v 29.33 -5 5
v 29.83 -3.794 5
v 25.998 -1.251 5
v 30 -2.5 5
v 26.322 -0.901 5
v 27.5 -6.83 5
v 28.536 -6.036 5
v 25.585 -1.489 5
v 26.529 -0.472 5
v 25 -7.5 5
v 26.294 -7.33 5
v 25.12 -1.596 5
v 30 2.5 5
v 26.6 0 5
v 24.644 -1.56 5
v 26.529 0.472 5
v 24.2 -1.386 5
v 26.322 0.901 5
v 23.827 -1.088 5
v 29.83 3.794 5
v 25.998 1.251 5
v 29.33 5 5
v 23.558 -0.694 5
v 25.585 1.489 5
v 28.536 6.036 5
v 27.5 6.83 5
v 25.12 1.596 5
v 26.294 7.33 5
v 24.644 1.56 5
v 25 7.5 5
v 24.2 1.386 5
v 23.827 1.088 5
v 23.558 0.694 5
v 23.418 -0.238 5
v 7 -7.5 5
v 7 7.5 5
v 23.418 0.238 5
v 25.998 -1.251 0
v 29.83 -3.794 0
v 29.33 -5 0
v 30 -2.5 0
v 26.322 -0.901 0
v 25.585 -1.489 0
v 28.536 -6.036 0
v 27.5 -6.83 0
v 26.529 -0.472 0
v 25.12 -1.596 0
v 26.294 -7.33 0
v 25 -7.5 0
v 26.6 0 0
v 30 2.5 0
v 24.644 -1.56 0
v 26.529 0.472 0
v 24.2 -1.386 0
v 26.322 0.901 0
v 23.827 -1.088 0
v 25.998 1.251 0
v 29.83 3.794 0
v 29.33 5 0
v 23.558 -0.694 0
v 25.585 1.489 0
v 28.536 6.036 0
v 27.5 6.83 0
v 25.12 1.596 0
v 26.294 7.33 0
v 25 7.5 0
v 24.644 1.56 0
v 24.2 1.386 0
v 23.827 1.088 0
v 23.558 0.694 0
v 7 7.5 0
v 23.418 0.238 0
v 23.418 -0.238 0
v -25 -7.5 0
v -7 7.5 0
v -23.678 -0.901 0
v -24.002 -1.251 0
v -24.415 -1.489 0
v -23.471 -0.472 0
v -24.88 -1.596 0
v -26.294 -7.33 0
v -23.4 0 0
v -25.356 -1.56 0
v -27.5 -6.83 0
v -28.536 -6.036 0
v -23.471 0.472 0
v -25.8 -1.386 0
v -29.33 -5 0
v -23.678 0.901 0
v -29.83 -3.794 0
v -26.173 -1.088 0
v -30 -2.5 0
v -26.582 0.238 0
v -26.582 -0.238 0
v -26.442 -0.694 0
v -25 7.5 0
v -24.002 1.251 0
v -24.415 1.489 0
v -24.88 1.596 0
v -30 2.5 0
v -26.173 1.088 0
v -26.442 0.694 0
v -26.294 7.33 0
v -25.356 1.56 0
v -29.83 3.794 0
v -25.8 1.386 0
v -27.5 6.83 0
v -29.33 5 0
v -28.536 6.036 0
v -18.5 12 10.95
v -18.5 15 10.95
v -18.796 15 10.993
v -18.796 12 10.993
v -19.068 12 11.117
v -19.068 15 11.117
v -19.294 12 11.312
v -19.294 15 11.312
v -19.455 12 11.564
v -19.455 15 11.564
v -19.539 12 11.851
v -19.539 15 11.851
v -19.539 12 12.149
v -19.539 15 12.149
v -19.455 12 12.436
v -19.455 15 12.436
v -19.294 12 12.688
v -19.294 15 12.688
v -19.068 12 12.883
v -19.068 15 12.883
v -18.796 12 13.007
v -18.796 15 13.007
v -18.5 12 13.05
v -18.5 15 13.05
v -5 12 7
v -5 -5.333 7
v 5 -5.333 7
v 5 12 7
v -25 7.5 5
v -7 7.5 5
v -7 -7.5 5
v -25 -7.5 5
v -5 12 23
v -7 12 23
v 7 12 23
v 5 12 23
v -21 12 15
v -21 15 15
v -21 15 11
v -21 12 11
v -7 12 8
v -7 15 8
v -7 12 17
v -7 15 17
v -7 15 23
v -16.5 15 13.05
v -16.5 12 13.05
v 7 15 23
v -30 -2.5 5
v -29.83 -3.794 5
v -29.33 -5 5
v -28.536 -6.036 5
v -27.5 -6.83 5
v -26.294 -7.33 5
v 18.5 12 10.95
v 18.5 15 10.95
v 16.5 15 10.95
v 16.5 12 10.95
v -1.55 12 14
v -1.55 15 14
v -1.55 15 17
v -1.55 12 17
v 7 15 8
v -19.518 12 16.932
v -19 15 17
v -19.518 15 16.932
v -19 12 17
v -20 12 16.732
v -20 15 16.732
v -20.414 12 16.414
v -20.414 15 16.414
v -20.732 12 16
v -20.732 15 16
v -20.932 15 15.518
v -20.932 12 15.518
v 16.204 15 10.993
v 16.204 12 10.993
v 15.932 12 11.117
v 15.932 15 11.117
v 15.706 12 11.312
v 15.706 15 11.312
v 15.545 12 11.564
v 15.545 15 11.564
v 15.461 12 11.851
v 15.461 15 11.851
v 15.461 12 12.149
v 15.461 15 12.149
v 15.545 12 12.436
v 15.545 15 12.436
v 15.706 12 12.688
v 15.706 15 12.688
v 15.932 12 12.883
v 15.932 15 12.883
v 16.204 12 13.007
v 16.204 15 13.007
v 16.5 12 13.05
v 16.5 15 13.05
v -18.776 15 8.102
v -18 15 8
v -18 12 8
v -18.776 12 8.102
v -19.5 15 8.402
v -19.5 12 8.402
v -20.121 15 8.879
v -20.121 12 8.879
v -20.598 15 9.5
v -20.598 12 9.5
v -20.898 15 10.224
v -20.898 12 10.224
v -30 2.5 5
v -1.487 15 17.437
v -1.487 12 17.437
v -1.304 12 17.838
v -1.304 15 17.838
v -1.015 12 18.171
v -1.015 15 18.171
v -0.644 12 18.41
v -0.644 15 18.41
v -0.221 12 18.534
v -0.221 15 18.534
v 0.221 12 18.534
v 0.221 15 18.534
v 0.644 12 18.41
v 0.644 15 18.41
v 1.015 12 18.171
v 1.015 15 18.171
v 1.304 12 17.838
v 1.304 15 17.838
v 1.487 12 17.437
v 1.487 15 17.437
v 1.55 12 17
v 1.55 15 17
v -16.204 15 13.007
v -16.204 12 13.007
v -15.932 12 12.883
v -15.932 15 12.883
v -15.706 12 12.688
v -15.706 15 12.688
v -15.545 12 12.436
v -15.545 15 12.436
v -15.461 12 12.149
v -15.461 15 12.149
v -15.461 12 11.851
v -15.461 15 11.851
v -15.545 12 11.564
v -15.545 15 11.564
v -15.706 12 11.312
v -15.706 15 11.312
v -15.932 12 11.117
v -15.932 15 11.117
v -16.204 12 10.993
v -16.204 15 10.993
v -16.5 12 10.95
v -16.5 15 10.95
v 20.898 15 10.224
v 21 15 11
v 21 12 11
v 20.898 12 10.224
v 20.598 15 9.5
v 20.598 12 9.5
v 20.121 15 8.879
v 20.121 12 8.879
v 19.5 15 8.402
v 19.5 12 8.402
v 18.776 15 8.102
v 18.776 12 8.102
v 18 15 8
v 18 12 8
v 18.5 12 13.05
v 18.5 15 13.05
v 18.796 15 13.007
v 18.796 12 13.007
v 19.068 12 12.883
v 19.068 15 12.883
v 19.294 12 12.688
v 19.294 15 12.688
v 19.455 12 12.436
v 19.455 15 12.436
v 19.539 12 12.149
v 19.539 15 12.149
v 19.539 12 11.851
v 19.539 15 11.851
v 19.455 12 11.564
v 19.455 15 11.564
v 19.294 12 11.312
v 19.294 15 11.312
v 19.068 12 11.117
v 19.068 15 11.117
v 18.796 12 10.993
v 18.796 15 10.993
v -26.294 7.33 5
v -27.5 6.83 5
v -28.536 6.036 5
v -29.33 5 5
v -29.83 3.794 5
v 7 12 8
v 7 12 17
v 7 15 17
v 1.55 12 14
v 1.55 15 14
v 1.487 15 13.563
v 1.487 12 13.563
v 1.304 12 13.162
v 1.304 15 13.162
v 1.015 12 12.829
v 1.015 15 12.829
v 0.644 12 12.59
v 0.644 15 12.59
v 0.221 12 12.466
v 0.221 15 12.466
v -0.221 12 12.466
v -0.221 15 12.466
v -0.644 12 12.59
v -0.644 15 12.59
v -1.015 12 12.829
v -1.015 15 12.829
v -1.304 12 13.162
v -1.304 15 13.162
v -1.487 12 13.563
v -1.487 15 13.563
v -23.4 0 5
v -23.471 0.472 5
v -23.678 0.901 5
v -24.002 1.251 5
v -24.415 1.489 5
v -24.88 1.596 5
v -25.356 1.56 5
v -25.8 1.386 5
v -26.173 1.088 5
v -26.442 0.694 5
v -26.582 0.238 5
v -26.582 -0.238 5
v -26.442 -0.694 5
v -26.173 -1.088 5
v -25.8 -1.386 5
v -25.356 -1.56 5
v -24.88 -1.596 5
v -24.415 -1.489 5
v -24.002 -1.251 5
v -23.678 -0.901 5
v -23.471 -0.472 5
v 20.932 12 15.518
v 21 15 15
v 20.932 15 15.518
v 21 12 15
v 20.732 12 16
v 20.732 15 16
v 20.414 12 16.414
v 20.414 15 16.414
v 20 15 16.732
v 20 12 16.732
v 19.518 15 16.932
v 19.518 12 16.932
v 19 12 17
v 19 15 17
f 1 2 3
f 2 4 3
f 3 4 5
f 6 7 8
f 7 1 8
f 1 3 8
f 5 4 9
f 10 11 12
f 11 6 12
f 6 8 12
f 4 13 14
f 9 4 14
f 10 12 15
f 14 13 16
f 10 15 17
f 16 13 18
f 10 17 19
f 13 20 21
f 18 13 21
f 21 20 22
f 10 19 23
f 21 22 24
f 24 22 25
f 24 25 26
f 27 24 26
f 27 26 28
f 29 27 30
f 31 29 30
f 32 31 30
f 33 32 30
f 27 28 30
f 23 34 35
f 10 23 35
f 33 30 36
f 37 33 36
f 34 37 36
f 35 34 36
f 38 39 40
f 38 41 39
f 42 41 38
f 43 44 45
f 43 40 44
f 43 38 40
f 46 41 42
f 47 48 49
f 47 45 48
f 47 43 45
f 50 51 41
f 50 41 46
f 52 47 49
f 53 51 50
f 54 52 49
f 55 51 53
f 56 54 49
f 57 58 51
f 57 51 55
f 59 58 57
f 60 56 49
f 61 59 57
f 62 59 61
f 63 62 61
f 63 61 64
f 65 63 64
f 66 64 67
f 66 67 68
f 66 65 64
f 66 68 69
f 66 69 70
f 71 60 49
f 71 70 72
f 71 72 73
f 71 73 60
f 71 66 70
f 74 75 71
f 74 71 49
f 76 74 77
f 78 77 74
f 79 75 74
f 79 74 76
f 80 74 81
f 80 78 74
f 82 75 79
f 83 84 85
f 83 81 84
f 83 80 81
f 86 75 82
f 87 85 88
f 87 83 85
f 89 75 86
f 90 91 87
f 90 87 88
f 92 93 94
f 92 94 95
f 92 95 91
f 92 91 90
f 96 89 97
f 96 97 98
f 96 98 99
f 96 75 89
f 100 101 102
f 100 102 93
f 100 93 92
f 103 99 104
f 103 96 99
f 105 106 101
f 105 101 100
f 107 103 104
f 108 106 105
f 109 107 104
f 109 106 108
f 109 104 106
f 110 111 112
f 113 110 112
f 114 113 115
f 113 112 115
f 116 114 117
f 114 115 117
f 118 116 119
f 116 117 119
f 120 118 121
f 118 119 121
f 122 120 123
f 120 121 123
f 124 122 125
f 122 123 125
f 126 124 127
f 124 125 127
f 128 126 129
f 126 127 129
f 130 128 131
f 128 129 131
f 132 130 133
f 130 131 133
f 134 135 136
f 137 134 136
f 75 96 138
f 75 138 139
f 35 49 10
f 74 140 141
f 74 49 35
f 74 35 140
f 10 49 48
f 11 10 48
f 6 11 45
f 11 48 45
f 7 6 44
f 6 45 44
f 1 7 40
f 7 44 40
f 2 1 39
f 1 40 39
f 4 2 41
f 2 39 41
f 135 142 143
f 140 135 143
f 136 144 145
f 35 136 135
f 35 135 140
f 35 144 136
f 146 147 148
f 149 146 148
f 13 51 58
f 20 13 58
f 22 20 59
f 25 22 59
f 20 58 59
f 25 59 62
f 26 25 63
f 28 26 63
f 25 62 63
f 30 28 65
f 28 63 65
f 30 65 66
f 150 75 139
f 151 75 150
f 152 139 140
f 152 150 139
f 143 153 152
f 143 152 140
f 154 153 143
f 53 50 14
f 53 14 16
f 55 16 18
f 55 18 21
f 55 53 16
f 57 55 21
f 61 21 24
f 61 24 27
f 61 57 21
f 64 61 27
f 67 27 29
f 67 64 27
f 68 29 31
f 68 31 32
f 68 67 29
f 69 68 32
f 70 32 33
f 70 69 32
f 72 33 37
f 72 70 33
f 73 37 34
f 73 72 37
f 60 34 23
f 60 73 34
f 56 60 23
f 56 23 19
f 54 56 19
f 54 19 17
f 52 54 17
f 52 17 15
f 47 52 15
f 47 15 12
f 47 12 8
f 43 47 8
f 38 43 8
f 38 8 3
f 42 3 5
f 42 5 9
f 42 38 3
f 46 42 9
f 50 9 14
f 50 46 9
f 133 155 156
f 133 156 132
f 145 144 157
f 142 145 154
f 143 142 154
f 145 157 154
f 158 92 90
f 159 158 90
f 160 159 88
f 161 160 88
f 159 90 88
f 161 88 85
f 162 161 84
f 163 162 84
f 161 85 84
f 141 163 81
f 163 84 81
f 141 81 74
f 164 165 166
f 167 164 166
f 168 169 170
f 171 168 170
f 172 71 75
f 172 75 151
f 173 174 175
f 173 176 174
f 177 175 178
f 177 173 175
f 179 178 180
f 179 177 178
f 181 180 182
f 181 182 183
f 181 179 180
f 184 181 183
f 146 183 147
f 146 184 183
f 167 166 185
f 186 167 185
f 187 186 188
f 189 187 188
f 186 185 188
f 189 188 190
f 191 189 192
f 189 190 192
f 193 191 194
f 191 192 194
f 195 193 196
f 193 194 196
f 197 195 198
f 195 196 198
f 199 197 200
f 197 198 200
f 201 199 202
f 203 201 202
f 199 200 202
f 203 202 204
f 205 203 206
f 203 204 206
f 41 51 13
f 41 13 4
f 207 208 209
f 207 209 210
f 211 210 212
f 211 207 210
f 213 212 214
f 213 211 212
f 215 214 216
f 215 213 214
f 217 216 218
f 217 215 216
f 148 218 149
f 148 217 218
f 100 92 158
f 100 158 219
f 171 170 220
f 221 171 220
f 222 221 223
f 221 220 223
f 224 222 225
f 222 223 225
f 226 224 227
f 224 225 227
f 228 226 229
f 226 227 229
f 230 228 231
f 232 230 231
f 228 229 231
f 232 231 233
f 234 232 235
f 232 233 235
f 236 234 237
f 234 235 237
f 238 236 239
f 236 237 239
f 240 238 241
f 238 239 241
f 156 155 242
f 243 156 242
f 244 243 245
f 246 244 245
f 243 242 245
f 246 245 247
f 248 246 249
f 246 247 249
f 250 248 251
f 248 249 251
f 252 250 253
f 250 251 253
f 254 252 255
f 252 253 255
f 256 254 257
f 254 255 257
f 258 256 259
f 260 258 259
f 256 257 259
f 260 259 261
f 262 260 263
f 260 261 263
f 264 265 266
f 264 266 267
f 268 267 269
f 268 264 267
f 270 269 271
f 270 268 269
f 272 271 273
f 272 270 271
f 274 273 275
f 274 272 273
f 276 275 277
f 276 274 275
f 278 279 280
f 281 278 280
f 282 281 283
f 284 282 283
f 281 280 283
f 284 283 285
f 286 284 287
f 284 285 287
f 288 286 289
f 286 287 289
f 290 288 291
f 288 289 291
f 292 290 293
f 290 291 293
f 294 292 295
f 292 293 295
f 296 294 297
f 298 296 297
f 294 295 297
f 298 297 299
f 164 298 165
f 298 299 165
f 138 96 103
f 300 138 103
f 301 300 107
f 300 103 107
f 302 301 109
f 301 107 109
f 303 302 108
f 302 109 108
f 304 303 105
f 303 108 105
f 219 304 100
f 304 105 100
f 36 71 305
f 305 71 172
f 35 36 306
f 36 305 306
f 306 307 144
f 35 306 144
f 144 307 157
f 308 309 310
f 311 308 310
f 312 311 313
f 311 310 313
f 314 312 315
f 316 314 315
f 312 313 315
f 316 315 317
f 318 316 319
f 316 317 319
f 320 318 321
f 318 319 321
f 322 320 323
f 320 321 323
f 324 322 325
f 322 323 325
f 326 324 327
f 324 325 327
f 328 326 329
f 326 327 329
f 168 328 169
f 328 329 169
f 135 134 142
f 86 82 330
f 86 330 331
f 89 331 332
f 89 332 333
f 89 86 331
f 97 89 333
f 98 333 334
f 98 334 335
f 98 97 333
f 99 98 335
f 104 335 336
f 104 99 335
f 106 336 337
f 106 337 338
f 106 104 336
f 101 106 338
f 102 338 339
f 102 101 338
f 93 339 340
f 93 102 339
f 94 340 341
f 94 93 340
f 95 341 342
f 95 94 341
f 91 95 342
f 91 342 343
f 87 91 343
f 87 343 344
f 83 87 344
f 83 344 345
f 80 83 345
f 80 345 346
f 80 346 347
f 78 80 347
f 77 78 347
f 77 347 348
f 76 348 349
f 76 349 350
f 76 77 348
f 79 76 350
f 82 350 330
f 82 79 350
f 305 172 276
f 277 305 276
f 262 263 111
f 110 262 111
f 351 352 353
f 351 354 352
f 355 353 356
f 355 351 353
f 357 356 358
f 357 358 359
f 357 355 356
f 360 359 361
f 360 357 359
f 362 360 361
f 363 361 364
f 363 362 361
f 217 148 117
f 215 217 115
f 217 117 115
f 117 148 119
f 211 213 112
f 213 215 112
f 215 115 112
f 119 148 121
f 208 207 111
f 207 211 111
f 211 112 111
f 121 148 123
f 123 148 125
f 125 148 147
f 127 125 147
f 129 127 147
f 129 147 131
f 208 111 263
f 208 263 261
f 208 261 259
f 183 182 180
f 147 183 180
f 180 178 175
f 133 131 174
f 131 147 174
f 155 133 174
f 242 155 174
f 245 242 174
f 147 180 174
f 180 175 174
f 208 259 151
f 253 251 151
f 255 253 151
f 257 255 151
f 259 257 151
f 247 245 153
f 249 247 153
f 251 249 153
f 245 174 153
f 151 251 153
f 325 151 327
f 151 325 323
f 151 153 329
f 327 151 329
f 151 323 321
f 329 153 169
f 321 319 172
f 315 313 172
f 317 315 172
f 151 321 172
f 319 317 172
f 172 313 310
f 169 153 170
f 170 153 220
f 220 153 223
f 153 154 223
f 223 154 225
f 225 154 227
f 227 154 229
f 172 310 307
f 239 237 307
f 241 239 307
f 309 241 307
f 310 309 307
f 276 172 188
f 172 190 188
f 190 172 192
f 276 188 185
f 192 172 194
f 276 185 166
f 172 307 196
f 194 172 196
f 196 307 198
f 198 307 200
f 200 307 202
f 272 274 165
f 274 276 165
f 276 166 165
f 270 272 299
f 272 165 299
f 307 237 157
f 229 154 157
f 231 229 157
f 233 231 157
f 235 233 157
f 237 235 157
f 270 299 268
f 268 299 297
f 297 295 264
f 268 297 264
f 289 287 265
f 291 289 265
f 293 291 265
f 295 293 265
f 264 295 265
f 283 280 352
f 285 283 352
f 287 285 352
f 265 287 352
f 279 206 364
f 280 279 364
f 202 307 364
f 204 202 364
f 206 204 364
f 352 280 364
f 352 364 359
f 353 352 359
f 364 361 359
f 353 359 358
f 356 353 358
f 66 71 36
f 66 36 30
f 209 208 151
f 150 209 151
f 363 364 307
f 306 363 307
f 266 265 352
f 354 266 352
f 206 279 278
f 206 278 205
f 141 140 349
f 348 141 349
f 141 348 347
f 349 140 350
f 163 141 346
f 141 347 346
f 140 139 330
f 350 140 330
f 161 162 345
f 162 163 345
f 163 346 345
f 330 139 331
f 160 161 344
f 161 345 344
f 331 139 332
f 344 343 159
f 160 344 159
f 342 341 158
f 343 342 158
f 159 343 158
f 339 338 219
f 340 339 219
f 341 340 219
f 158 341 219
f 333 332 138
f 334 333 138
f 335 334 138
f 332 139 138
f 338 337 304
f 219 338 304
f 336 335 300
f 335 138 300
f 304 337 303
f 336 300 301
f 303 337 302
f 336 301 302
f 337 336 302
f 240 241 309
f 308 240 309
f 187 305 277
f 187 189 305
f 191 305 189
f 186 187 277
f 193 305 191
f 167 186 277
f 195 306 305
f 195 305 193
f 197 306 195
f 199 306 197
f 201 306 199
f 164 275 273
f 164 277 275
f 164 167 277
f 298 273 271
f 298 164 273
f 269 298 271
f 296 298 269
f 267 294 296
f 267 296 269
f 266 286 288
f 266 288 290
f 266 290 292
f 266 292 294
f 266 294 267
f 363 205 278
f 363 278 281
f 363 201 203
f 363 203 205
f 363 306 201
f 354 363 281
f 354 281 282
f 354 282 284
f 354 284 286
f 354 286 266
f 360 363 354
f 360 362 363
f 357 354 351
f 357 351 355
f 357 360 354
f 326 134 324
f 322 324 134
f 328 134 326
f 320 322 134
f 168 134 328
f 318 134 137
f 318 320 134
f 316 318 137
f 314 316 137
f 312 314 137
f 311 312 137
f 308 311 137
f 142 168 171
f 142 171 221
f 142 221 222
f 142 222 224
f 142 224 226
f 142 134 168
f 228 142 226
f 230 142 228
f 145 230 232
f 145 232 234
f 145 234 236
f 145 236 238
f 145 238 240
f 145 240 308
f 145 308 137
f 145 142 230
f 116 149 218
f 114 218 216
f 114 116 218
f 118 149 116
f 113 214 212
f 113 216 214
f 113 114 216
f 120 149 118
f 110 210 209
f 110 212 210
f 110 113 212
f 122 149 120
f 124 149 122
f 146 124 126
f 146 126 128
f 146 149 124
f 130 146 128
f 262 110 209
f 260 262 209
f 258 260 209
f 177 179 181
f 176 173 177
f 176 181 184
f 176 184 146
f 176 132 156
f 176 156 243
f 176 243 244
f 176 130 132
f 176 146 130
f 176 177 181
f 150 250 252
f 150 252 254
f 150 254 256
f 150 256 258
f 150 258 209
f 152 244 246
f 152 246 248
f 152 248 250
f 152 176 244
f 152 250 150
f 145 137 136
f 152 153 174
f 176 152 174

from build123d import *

# Parameters (mm, degrees)
SKETCH_R        = 1.6
PAD_DEPTH       = 5
PAD001_DEPTH    = 7
COPYSKETCH002_W = 10
COPYSKETCH002_H = 18
POCKET_DEPTH    = 19.5
PAD002_DEPTH    = 3
POCKET001_DEPTH = 5
SKETCH004_W     = 14
SKETCH004_H     = 6
POCKET002_DEPTH = 5
FILLET_R        = 2
FILLET001_R     = 2


with BuildPart() as part:
    # Sketch → Pad (new body)
    with BuildSketch(Plane.XY):
        with BuildLine():
            Line((-25, 7.5), (25, 7.5))
            ThreePointArc((30, 2.5), (28.535534, 6.035534), (25, 7.5))
            Line((30, 2.5), (30, -2.5))
            ThreePointArc((25, -7.5), (28.535534, -6.035534), (30, -2.5))
            Line((25, -7.5), (-25, -7.5))
            ThreePointArc((-30, -2.5), (-28.535534, -6.035534), (-25, -7.5))
            Line((-30, -2.5), (-30, 2.5))
            ThreePointArc((-25, 7.5), (-28.535534, 6.035534), (-30, 2.5))
        make_face()
        with Locations((-25, 0)):
            Circle(SKETCH_R, mode=Mode.SUBTRACT)
        with Locations((25, 0)):
            Circle(SKETCH_R, mode=Mode.SUBTRACT)
    extrude(amount=PAD_DEPTH)

    # Sketch001 → Pad001 (join, symmetric)
    with BuildSketch(Plane.YZ):
        Polygon((-7.5, 5), (7.5, 5), (7.5, 0), (15, 8), (15, 23), (12, 23), align=None)
    extrude(amount=PAD001_DEPTH, both=True)

    # CopySketch002 → Pocket (cut)
    with BuildSketch(Plane.XZ.offset(7.5)):
        with Locations((0, 16)):
            Rectangle(COPYSKETCH002_W, COPYSKETCH002_H)
    extrude(amount=-POCKET_DEPTH, mode=Mode.SUBTRACT)

    # Sketch003 (on Face18 of Pocket) → Pad002 (join)
    with BuildSketch(Plane(origin=(0, 15, 0), x_dir=(-1, 0, 0), z_dir=(0, 1, 0))):
        with BuildLine():
            Line((-18, 23), (18, 23))
            ThreePointArc((21, 20), (20.12132, 22.12132), (18, 23))
            Line((21, 20), (21, 11))
            ThreePointArc((18, 8), (20.12132, 8.87868), (21, 11))
            Line((18, 8), (-18, 8))
            ThreePointArc((-21, 11), (-20.12132, 8.87868), (-18, 8))
            Line((-21, 11), (-21, 20))
            ThreePointArc((-18, 23), (-20.12132, 22.12132), (-21, 20))
        make_face()
        with BuildLine():
            Line((-18.5, 13.05), (-16.5, 13.05))
            ThreePointArc((-16.5, 10.95), (-15.45, 12), (-16.5, 13.05))
            Line((-18.5, 10.95), (-16.5, 10.95))
            ThreePointArc((-18.5, 13.05), (-19.55, 12), (-18.5, 10.95))
        make_face(mode=Mode.SUBTRACT)
        with BuildLine():
            Line((16.5, 13.05), (18.5, 13.05))
            ThreePointArc((18.5, 10.95), (19.549988, 12), (18.5, 13.05))
            Line((16.5, 10.95), (18.5, 10.95))
            ThreePointArc((16.5, 13.05), (15.45, 12), (16.5, 10.95))
        make_face(mode=Mode.SUBTRACT)
        with BuildLine():
            Line((-1.55, 16.999987), (-1.55, 13.999987))
            ThreePointArc((-1.55, 13.999987), (0, 12.45), (1.55, 13.999987))
            Line((1.55, 16.999987), (1.55, 13.999987))
            ThreePointArc((1.55, 16.999987), (0, 18.549987), (-1.55, 16.999987))
        make_face(mode=Mode.SUBTRACT)
    extrude(amount=-PAD002_DEPTH)

    # Pad002 Face28 → Pocket001 (cut)
    with BuildSketch(Plane(origin=(0, 15, 15.499993), x_dir=(1, 0, 0), z_dir=(0, 1, 0))):
        with BuildLine():
            ThreePointArc((-1.55, -1.499993), (0, -3.049993), (1.55, -1.499993))
            Line((1.55, -1.499993), (1.55, 1.500007))
            ThreePointArc((1.55, 1.500007), (0, 3.049993), (-1.55, 1.500007))
            Line((-1.55, 1.500007), (-1.55, -1.499993))
        make_face()
    extrude(amount=-POCKET001_DEPTH, mode=Mode.SUBTRACT)

    # Sketch004 (on Face18 of Pad002) → Pocket002 (cut)
    with BuildSketch(Plane(origin=(0, 15, 0), x_dir=(-1, 0, 0), z_dir=(0, 1, 0))):
        with Locations((-14, 20)):
            Rectangle(SKETCH004_W, SKETCH004_H)
        with Locations((14, 20)):
            Rectangle(SKETCH004_W, SKETCH004_H)
    extrude(amount=-POCKET002_DEPTH, mode=Mode.SUBTRACT)

    # Fillet
    fillet_edges = [part.edges().sort_by_distance(p)[0] for p in [
        (21, 13.5, 17),
    ]]
    fillet(fillet_edges, radius=FILLET_R)

    # Fillet001
    fillet001_edges = [part.edges().sort_by_distance(p)[0] for p in [
        (-21, 13.5, 17),
    ]]
    fillet(fillet001_edges, radius=FILLET001_R)


solid = part.part
